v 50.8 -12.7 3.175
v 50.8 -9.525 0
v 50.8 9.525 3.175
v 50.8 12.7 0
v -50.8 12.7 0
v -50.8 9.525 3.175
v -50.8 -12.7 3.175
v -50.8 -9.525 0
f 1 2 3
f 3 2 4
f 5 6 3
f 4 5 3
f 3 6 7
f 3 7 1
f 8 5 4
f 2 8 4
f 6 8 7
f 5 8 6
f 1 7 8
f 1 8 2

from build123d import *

# Parameters (mm, degrees)
F0_W     = 101.6
F0_H     = 25.4
F1_DEPTH = 3.175
F2_SIZE  = 3.17499
F3_SIZE  = 3.17499


# Not quite as in the source:
# - a fillet or chamfer is up to 0.001 mm smaller than in the source, because OpenCascade refuses the exact size
# - a length typed as a fraction of an inch, garbled in the dataset ("3 / 203.2 mm" for 3/8 in), is restored


with BuildPart() as f1:
    # F0 (on Top) → F1 (new body)
    with BuildSketch(Plane.XY):
        Rectangle(F0_W, F0_H)
    extrude(amount=F1_DEPTH)

    # F2 (size 3.175 in the source; OpenCascade refuses exactly that, so slightly less here)
    f2_edges = [f1.edges().sort_by_distance(p)[0] for p in [
        (0, 12.7, 3.175),
    ]]
    chamfer(f2_edges, length=F2_SIZE)

    # F3 (size 3.175 in the source; OpenCascade refuses exactly that, so slightly less here)
    f3_edges = [f1.edges().sort_by_distance(p)[0] for p in [
        (0, -12.7, 0),
    ]]
    chamfer(f3_edges, length=F3_SIZE)


solid = f1.part
